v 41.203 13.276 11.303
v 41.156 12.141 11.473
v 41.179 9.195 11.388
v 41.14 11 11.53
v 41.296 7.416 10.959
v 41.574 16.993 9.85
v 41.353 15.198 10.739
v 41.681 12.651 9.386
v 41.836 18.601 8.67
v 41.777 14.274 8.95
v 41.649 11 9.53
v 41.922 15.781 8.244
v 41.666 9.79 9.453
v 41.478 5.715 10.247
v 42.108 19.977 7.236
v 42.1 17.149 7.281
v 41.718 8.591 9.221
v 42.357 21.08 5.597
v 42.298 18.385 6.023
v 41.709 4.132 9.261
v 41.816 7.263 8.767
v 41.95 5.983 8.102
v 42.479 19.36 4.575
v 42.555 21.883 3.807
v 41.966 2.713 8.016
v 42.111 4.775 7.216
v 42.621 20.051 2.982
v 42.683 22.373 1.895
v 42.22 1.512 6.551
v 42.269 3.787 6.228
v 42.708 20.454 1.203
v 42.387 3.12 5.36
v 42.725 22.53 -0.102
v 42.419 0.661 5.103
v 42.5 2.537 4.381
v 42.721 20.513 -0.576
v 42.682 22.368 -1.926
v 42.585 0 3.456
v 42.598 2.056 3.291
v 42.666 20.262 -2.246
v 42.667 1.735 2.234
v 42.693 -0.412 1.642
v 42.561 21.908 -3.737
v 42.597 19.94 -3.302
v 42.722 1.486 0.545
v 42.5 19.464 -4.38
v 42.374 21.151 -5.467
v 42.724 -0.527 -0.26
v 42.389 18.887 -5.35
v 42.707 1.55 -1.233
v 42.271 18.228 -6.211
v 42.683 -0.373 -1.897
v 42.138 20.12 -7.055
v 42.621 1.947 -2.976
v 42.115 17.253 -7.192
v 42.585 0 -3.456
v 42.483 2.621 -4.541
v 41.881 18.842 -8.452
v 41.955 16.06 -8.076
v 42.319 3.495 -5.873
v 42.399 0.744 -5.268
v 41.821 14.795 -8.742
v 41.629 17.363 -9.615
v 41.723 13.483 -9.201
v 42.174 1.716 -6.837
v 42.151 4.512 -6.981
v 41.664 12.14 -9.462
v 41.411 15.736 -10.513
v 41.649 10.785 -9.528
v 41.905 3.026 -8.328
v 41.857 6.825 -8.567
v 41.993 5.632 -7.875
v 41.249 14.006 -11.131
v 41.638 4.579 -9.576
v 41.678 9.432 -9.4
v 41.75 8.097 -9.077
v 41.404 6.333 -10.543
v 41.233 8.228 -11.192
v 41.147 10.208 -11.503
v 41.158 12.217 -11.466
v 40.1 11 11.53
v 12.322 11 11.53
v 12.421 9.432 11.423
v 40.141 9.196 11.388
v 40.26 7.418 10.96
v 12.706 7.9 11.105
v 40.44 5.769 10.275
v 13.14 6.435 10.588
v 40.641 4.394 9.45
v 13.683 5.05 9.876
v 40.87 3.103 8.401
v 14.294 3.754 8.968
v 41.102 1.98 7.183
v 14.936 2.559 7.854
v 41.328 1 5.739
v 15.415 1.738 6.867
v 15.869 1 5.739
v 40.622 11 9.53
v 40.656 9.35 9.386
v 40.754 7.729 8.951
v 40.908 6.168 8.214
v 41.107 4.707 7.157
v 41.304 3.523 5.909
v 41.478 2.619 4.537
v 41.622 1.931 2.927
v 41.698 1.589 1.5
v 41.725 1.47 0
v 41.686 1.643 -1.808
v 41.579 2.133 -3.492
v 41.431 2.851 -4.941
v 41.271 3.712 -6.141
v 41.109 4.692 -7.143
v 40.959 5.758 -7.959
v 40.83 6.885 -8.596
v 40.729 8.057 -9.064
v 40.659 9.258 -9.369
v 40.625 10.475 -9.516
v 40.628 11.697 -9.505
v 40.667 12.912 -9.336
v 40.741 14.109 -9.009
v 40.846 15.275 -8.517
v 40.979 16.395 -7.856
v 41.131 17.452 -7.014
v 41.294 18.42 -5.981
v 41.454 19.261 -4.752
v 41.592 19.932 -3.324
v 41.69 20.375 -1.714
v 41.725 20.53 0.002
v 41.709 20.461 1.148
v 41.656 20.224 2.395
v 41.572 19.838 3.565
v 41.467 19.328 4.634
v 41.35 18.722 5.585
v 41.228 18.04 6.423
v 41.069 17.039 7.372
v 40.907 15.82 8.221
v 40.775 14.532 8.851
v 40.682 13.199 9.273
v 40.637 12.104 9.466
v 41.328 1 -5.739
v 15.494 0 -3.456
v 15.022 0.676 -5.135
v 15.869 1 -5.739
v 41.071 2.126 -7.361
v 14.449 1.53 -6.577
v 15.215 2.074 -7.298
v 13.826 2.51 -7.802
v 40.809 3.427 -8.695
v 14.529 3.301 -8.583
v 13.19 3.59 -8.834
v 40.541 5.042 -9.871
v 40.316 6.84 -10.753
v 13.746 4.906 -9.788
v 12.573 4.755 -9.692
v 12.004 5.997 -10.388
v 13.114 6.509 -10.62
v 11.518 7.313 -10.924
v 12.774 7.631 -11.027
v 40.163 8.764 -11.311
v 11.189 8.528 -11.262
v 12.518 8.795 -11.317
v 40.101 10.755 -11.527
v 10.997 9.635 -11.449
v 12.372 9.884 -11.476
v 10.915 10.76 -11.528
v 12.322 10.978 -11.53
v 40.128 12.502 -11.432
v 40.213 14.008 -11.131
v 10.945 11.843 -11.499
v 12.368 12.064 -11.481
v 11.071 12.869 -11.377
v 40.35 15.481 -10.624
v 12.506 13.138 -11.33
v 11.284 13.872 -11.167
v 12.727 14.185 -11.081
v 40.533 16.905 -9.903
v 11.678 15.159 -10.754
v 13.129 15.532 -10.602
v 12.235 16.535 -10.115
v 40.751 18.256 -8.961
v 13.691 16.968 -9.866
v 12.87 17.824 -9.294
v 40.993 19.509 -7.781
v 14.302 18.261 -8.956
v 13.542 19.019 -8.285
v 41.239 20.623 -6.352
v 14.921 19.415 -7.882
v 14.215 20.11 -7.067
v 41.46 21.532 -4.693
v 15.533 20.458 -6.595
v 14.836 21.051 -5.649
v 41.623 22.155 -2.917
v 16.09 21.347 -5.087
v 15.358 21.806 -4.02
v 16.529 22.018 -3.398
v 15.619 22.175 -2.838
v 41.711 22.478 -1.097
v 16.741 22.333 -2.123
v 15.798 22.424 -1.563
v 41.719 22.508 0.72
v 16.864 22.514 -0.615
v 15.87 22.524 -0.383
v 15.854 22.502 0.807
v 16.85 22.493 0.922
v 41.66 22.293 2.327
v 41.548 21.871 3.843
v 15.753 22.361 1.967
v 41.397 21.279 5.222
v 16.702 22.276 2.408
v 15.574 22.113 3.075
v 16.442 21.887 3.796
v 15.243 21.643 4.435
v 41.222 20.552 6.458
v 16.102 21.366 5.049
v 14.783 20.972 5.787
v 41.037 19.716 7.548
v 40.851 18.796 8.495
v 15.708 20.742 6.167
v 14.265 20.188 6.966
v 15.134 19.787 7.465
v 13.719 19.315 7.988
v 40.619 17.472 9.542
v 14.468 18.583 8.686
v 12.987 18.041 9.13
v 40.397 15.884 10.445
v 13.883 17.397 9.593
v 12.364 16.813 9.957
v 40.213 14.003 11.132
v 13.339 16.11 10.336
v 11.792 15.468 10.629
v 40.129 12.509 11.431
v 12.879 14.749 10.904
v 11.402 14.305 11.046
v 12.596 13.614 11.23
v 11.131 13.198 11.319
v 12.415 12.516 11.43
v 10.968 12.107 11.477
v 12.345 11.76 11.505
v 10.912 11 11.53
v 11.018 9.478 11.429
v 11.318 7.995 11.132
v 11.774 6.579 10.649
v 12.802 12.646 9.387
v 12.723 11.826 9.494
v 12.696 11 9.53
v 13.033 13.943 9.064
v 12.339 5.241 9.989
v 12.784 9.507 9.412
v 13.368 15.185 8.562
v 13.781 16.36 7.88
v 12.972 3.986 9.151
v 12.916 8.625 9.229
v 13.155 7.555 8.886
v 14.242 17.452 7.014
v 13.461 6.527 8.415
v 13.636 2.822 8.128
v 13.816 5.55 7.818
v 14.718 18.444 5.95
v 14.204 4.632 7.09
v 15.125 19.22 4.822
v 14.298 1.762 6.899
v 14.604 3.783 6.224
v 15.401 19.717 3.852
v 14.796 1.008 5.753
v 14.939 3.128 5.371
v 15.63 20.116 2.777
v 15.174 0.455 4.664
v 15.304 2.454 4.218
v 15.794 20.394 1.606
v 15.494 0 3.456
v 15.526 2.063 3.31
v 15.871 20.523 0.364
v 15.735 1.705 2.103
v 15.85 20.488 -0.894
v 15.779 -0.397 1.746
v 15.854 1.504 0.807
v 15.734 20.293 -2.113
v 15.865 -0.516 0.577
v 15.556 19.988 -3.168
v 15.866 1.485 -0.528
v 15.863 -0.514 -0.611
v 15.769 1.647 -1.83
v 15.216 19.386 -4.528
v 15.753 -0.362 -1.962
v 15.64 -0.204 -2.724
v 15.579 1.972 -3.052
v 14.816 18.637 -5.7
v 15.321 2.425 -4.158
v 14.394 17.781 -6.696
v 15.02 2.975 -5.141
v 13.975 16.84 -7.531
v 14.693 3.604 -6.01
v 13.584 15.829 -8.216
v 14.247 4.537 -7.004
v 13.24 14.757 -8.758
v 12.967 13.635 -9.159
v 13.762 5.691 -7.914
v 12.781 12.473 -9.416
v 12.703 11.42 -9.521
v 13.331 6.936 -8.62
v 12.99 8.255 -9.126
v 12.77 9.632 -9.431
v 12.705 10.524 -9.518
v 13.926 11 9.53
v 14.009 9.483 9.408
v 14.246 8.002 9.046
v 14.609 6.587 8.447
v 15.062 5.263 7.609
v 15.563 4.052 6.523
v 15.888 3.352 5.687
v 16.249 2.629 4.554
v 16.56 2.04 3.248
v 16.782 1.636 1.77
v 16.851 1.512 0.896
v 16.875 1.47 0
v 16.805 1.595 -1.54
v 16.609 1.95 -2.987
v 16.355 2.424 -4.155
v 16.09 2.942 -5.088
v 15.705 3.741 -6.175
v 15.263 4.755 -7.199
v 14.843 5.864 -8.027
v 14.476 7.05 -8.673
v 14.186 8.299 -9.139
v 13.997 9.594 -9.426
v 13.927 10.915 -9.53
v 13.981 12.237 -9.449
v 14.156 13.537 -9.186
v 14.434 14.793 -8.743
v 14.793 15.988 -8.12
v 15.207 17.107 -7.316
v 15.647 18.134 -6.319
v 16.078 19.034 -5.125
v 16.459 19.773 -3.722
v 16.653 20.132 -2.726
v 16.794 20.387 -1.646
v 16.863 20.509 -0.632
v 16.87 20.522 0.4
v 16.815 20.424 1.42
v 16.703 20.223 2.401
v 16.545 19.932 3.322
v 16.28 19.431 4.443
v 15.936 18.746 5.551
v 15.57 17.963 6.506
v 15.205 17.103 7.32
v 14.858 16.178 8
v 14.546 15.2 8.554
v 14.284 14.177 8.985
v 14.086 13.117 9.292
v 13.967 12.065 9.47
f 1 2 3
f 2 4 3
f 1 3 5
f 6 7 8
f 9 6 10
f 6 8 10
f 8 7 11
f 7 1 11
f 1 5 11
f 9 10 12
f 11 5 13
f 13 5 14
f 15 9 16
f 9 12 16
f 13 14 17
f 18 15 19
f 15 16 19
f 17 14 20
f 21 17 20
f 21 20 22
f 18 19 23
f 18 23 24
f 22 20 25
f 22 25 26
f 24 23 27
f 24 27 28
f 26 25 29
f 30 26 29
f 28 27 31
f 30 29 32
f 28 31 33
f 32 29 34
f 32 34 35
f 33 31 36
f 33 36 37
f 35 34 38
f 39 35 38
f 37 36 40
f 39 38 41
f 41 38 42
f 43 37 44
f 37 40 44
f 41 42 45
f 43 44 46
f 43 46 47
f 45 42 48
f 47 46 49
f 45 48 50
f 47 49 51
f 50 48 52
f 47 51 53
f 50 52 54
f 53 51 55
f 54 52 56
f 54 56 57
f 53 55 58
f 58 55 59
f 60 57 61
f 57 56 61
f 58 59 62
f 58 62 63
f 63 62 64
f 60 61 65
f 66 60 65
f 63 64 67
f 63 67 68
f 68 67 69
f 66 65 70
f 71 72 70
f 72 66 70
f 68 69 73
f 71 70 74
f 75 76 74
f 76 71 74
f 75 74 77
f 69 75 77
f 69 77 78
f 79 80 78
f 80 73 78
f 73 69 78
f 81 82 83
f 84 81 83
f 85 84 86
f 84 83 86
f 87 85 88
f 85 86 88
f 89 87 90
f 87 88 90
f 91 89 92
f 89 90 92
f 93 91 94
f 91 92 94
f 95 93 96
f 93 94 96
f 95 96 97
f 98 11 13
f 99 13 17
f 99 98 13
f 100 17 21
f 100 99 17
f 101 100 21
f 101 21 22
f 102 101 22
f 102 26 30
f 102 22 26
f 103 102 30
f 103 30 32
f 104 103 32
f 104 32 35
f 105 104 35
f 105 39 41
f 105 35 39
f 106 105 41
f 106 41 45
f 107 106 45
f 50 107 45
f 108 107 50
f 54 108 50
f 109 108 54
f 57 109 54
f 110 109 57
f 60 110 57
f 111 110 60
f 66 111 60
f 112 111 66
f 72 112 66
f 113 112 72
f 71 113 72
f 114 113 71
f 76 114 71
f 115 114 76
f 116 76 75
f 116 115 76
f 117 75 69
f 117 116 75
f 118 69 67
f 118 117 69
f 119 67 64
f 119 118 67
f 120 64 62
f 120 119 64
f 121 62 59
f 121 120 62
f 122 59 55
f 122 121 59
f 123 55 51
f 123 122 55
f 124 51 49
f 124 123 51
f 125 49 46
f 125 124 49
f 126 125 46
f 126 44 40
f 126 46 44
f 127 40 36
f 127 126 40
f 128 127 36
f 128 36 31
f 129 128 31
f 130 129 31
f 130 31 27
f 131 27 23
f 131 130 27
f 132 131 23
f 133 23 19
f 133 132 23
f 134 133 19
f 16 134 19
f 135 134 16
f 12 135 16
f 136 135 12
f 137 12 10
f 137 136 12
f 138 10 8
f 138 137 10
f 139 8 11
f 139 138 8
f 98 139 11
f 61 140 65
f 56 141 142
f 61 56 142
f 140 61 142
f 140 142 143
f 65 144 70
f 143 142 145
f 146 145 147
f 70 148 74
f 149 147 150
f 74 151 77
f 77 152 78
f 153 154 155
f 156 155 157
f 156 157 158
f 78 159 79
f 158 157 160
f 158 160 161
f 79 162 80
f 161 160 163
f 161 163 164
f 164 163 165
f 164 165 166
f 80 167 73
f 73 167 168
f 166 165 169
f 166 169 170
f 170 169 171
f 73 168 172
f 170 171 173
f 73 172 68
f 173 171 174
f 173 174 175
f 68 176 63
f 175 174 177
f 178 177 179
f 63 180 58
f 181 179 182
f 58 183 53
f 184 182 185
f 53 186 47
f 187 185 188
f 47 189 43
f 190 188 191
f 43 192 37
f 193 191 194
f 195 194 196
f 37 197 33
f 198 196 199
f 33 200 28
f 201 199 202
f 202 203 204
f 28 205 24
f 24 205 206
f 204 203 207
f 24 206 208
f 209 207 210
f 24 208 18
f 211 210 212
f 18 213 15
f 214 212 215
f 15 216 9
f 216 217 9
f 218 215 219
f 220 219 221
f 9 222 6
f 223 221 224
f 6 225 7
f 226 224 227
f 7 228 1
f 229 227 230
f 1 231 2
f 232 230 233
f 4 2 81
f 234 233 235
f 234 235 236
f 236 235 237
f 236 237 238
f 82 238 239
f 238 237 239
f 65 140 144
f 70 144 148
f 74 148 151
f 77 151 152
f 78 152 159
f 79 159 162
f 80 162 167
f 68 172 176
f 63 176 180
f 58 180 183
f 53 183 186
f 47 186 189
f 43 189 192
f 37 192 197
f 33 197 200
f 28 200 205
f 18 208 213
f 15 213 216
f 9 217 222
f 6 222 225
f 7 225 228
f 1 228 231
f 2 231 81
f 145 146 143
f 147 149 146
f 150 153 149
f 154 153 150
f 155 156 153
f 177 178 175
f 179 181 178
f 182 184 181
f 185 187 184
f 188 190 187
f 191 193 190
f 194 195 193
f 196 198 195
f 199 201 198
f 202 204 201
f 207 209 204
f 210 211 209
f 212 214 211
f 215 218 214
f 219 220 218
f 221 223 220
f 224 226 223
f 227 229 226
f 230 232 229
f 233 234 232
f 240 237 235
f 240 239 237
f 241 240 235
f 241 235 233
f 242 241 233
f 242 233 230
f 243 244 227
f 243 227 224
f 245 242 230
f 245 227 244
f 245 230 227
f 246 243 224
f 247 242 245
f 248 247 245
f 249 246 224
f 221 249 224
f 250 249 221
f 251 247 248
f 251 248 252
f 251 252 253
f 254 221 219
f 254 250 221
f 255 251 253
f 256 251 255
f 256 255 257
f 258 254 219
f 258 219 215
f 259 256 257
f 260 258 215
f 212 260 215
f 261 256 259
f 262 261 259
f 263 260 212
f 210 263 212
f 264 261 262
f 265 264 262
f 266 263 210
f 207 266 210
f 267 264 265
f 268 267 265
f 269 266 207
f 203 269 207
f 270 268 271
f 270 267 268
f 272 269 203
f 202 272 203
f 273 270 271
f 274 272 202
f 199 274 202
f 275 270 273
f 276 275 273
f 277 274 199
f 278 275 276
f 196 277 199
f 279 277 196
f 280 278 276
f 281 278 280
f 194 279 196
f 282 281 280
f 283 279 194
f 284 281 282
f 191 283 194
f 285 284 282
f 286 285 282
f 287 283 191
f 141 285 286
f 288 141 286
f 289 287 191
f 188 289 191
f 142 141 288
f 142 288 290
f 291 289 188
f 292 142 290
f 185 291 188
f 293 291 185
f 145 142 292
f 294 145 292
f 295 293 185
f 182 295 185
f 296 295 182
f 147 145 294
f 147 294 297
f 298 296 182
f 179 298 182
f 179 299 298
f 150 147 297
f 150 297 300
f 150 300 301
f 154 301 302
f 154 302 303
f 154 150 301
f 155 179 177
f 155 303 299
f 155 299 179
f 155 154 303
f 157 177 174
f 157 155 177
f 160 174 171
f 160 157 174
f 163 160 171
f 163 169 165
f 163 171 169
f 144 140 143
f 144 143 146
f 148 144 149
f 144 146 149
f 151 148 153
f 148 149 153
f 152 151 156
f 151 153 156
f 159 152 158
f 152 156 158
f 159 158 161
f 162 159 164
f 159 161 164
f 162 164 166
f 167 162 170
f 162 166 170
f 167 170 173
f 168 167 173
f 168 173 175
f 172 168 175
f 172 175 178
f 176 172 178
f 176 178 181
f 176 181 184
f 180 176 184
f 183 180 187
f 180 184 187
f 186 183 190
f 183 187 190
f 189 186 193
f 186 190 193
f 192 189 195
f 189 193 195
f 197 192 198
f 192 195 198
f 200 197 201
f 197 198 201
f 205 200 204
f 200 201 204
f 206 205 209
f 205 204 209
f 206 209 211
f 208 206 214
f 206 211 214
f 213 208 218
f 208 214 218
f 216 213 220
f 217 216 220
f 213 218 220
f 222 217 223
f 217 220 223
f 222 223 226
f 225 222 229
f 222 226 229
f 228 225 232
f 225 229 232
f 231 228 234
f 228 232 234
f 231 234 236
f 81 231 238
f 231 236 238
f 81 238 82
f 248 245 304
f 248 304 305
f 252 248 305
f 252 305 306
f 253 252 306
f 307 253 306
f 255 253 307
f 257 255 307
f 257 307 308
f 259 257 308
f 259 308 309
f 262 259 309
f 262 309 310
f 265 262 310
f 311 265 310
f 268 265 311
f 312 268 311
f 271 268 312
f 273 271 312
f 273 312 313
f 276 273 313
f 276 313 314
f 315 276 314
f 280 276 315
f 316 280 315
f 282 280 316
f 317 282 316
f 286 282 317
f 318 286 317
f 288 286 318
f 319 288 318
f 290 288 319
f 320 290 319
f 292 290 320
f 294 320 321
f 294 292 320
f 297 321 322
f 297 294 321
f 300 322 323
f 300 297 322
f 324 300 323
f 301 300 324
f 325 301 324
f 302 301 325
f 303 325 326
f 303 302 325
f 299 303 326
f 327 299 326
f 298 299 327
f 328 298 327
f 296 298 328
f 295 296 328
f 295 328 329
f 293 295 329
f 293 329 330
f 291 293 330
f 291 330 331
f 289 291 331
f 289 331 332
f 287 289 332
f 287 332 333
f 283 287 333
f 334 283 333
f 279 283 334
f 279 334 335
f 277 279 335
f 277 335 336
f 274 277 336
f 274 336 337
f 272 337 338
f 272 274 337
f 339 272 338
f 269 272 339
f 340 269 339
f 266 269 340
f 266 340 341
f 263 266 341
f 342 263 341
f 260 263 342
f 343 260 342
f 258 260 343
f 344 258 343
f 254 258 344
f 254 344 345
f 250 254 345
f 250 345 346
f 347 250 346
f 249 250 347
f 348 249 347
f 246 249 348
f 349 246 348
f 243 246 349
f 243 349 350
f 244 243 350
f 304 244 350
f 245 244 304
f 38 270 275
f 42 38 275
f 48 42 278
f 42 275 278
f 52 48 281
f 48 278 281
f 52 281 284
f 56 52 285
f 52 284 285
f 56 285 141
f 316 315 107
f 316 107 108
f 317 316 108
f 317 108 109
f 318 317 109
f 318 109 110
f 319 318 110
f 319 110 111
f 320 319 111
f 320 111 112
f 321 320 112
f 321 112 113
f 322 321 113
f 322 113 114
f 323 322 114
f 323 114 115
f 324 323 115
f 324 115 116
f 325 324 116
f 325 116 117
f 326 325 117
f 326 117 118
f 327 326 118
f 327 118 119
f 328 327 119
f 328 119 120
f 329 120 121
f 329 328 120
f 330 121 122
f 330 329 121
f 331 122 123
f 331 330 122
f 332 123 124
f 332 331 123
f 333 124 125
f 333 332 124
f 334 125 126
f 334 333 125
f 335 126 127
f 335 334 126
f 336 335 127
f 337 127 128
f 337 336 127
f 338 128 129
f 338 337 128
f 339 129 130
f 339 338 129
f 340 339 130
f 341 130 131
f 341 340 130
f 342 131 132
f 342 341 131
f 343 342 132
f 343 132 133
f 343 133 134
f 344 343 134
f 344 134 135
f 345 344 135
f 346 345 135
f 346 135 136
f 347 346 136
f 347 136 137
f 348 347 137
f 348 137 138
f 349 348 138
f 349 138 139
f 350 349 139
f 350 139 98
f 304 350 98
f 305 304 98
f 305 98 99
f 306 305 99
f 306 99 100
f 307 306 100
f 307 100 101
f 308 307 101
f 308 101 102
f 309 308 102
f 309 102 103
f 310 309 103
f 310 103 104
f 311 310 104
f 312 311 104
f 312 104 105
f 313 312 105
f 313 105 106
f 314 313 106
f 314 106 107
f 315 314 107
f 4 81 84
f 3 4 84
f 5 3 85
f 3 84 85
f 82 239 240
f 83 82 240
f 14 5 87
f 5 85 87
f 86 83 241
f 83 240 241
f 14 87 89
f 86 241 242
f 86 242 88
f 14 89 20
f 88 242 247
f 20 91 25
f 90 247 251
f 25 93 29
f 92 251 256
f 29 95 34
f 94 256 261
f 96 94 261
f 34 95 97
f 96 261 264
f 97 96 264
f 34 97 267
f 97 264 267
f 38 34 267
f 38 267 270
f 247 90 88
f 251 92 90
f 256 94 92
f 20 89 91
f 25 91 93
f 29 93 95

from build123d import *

# Parameters (mm, degrees)
SKETCH1_R                = 42.725
SKETCH1_R_2              = 15.875
BOSS_EXTRUDE1_DEPTH      = 1
SKETCH2_R                = 42.725
SKETCH2_R_2              = 41.725
SKETCH2_R_3              = 16.875
SKETCH2_R_4              = 15.875
BOSS_EXTRUDE2_DEPTH      = 25
SKETCH3_R                = 9.53
CUT_EXTRUDE1_DEPTH       = 66.778805477
BOSS_EXTRUDE3_REACH      = 67.779
BOSS_EXTRUDE3_END_RADIUS = 42.725
SKETCH9_R                = 11.53
SKETCH9_R_2              = 9.53
CUT_EXTRUDE2_DEPTH       = 66.990091471
CUT_EXTRUDE2_DEPTH_BACK  = 66.990091471
CUT_EXTRUDE4_DEPTH       = 53.449977529
CUT_EXTRUDE4_DEPTH_BACK  = 53.449977529
SKETCH11_R               = 50
SKETCH11_R_2             = 11.53


with BuildPart() as part:
    # Sketch1 → Boss-Extrude1 (new body)
    with BuildSketch(Plane(origin=(0, 0, 0), x_dir=(1, 0, 0), z_dir=(0, 1, 0))):
        Circle(SKETCH1_R)
        Circle(SKETCH1_R_2, mode=Mode.SUBTRACT)
    extrude(amount=BOSS_EXTRUDE1_DEPTH)

    # Sketch2 → Boss-Extrude2 (add)
    # profile 1 of 2: a face of its own
    with BuildSketch(Plane(origin=(0, 1, 0), x_dir=(1, 0, 0), z_dir=(0, 1, 0))):
        Circle(SKETCH2_R)
        Circle(SKETCH2_R_2, mode=Mode.SUBTRACT)
    # profile 2 of 2: a face of its own
    with BuildSketch(Plane(origin=(0, 1, 0), x_dir=(1, 0, 0), z_dir=(0, 1, 0))):
        Circle(SKETCH2_R_3)
        Circle(SKETCH2_R_4, mode=Mode.SUBTRACT)
    extrude(amount=BOSS_EXTRUDE2_DEPTH)

    # Sketch3 → Cut-Extrude1 (cut, through all)
    with BuildSketch(Plane(origin=(0, 0, 0), x_dir=(0, 0, -1), z_dir=(1, 0, 0))):
        with Locations((0, 11)):
            Circle(SKETCH3_R)
    extrude(amount=CUT_EXTRUDE1_DEPTH, mode=Mode.SUBTRACT)

    # Boss-Extrude3: up to this cylinder (the profile starts inside it)
    boss_extrude3_end = Plane(origin=(0, 11, 0), z_dir=(0, -1, 0)) * Cylinder(BOSS_EXTRUDE3_END_RADIUS, 222.008, mode=Mode.PRIVATE)
    # Sketch9 → Boss-Extrude3 (add, up to the surface)
    with BuildSketch(Plane(origin=(0, 0, 0), x_dir=(0, 0, -1), z_dir=(1, 0, 0)), mode=Mode.PRIVATE) as boss_extrude3_sk1:
        with Locations((0, 11)):
            Circle(SKETCH9_R)
        with Locations((0, 11)):
            Circle(SKETCH9_R_2, mode=Mode.SUBTRACT)
    boss_extrude3_tool1 = extrude(boss_extrude3_sk1.sketch, amount=BOSS_EXTRUDE3_REACH, mode=Mode.PRIVATE) & boss_extrude3_end
    add(boss_extrude3_tool1.solids().sort_by_distance((0, 11, 11.203882))[0])

    # Sketch10 → Cut-Extrude2 (cut, two sides: drawn at the far end of the back side and taken through both)
    with BuildSketch(Plane(origin=(0, 26, 0), x_dir=(1, 0, 0), z_dir=(0, 1, 0)).offset(-CUT_EXTRUDE2_DEPTH_BACK)):
        with BuildLine():
            ThreePointArc((1.562409729, -15.797927106), (15.875, 0), (1.562409729, 15.797927106))
            Line((1.562409729, 15.797927106), (41.036063238, 11.893995921))
            ThreePointArc((41.036063238, 11.893995921), (-42.725, 0), (41.036063238, -11.893995921))
            Line((41.036063238, -11.893995921), (1.562409729, -15.797927106))
        make_face()
    extrude(amount=CUT_EXTRUDE2_DEPTH + CUT_EXTRUDE2_DEPTH_BACK, mode=Mode.SUBTRACT)

    # Sketch11 → Cut-Extrude4 (cut, two sides: drawn at the far end of the back side and taken through both)
    with BuildSketch(Plane(origin=(0, 0, 0), x_dir=(0, 0, -1), z_dir=(1, 0, 0)).offset(-CUT_EXTRUDE4_DEPTH_BACK)):
        with Locations((0, 11)):
            Circle(SKETCH11_R)
        with Locations((0, 11)):
            Circle(SKETCH11_R_2, mode=Mode.SUBTRACT)
    extrude(amount=CUT_EXTRUDE4_DEPTH + CUT_EXTRUDE4_DEPTH_BACK, mode=Mode.SUBTRACT)


solid = part.part
